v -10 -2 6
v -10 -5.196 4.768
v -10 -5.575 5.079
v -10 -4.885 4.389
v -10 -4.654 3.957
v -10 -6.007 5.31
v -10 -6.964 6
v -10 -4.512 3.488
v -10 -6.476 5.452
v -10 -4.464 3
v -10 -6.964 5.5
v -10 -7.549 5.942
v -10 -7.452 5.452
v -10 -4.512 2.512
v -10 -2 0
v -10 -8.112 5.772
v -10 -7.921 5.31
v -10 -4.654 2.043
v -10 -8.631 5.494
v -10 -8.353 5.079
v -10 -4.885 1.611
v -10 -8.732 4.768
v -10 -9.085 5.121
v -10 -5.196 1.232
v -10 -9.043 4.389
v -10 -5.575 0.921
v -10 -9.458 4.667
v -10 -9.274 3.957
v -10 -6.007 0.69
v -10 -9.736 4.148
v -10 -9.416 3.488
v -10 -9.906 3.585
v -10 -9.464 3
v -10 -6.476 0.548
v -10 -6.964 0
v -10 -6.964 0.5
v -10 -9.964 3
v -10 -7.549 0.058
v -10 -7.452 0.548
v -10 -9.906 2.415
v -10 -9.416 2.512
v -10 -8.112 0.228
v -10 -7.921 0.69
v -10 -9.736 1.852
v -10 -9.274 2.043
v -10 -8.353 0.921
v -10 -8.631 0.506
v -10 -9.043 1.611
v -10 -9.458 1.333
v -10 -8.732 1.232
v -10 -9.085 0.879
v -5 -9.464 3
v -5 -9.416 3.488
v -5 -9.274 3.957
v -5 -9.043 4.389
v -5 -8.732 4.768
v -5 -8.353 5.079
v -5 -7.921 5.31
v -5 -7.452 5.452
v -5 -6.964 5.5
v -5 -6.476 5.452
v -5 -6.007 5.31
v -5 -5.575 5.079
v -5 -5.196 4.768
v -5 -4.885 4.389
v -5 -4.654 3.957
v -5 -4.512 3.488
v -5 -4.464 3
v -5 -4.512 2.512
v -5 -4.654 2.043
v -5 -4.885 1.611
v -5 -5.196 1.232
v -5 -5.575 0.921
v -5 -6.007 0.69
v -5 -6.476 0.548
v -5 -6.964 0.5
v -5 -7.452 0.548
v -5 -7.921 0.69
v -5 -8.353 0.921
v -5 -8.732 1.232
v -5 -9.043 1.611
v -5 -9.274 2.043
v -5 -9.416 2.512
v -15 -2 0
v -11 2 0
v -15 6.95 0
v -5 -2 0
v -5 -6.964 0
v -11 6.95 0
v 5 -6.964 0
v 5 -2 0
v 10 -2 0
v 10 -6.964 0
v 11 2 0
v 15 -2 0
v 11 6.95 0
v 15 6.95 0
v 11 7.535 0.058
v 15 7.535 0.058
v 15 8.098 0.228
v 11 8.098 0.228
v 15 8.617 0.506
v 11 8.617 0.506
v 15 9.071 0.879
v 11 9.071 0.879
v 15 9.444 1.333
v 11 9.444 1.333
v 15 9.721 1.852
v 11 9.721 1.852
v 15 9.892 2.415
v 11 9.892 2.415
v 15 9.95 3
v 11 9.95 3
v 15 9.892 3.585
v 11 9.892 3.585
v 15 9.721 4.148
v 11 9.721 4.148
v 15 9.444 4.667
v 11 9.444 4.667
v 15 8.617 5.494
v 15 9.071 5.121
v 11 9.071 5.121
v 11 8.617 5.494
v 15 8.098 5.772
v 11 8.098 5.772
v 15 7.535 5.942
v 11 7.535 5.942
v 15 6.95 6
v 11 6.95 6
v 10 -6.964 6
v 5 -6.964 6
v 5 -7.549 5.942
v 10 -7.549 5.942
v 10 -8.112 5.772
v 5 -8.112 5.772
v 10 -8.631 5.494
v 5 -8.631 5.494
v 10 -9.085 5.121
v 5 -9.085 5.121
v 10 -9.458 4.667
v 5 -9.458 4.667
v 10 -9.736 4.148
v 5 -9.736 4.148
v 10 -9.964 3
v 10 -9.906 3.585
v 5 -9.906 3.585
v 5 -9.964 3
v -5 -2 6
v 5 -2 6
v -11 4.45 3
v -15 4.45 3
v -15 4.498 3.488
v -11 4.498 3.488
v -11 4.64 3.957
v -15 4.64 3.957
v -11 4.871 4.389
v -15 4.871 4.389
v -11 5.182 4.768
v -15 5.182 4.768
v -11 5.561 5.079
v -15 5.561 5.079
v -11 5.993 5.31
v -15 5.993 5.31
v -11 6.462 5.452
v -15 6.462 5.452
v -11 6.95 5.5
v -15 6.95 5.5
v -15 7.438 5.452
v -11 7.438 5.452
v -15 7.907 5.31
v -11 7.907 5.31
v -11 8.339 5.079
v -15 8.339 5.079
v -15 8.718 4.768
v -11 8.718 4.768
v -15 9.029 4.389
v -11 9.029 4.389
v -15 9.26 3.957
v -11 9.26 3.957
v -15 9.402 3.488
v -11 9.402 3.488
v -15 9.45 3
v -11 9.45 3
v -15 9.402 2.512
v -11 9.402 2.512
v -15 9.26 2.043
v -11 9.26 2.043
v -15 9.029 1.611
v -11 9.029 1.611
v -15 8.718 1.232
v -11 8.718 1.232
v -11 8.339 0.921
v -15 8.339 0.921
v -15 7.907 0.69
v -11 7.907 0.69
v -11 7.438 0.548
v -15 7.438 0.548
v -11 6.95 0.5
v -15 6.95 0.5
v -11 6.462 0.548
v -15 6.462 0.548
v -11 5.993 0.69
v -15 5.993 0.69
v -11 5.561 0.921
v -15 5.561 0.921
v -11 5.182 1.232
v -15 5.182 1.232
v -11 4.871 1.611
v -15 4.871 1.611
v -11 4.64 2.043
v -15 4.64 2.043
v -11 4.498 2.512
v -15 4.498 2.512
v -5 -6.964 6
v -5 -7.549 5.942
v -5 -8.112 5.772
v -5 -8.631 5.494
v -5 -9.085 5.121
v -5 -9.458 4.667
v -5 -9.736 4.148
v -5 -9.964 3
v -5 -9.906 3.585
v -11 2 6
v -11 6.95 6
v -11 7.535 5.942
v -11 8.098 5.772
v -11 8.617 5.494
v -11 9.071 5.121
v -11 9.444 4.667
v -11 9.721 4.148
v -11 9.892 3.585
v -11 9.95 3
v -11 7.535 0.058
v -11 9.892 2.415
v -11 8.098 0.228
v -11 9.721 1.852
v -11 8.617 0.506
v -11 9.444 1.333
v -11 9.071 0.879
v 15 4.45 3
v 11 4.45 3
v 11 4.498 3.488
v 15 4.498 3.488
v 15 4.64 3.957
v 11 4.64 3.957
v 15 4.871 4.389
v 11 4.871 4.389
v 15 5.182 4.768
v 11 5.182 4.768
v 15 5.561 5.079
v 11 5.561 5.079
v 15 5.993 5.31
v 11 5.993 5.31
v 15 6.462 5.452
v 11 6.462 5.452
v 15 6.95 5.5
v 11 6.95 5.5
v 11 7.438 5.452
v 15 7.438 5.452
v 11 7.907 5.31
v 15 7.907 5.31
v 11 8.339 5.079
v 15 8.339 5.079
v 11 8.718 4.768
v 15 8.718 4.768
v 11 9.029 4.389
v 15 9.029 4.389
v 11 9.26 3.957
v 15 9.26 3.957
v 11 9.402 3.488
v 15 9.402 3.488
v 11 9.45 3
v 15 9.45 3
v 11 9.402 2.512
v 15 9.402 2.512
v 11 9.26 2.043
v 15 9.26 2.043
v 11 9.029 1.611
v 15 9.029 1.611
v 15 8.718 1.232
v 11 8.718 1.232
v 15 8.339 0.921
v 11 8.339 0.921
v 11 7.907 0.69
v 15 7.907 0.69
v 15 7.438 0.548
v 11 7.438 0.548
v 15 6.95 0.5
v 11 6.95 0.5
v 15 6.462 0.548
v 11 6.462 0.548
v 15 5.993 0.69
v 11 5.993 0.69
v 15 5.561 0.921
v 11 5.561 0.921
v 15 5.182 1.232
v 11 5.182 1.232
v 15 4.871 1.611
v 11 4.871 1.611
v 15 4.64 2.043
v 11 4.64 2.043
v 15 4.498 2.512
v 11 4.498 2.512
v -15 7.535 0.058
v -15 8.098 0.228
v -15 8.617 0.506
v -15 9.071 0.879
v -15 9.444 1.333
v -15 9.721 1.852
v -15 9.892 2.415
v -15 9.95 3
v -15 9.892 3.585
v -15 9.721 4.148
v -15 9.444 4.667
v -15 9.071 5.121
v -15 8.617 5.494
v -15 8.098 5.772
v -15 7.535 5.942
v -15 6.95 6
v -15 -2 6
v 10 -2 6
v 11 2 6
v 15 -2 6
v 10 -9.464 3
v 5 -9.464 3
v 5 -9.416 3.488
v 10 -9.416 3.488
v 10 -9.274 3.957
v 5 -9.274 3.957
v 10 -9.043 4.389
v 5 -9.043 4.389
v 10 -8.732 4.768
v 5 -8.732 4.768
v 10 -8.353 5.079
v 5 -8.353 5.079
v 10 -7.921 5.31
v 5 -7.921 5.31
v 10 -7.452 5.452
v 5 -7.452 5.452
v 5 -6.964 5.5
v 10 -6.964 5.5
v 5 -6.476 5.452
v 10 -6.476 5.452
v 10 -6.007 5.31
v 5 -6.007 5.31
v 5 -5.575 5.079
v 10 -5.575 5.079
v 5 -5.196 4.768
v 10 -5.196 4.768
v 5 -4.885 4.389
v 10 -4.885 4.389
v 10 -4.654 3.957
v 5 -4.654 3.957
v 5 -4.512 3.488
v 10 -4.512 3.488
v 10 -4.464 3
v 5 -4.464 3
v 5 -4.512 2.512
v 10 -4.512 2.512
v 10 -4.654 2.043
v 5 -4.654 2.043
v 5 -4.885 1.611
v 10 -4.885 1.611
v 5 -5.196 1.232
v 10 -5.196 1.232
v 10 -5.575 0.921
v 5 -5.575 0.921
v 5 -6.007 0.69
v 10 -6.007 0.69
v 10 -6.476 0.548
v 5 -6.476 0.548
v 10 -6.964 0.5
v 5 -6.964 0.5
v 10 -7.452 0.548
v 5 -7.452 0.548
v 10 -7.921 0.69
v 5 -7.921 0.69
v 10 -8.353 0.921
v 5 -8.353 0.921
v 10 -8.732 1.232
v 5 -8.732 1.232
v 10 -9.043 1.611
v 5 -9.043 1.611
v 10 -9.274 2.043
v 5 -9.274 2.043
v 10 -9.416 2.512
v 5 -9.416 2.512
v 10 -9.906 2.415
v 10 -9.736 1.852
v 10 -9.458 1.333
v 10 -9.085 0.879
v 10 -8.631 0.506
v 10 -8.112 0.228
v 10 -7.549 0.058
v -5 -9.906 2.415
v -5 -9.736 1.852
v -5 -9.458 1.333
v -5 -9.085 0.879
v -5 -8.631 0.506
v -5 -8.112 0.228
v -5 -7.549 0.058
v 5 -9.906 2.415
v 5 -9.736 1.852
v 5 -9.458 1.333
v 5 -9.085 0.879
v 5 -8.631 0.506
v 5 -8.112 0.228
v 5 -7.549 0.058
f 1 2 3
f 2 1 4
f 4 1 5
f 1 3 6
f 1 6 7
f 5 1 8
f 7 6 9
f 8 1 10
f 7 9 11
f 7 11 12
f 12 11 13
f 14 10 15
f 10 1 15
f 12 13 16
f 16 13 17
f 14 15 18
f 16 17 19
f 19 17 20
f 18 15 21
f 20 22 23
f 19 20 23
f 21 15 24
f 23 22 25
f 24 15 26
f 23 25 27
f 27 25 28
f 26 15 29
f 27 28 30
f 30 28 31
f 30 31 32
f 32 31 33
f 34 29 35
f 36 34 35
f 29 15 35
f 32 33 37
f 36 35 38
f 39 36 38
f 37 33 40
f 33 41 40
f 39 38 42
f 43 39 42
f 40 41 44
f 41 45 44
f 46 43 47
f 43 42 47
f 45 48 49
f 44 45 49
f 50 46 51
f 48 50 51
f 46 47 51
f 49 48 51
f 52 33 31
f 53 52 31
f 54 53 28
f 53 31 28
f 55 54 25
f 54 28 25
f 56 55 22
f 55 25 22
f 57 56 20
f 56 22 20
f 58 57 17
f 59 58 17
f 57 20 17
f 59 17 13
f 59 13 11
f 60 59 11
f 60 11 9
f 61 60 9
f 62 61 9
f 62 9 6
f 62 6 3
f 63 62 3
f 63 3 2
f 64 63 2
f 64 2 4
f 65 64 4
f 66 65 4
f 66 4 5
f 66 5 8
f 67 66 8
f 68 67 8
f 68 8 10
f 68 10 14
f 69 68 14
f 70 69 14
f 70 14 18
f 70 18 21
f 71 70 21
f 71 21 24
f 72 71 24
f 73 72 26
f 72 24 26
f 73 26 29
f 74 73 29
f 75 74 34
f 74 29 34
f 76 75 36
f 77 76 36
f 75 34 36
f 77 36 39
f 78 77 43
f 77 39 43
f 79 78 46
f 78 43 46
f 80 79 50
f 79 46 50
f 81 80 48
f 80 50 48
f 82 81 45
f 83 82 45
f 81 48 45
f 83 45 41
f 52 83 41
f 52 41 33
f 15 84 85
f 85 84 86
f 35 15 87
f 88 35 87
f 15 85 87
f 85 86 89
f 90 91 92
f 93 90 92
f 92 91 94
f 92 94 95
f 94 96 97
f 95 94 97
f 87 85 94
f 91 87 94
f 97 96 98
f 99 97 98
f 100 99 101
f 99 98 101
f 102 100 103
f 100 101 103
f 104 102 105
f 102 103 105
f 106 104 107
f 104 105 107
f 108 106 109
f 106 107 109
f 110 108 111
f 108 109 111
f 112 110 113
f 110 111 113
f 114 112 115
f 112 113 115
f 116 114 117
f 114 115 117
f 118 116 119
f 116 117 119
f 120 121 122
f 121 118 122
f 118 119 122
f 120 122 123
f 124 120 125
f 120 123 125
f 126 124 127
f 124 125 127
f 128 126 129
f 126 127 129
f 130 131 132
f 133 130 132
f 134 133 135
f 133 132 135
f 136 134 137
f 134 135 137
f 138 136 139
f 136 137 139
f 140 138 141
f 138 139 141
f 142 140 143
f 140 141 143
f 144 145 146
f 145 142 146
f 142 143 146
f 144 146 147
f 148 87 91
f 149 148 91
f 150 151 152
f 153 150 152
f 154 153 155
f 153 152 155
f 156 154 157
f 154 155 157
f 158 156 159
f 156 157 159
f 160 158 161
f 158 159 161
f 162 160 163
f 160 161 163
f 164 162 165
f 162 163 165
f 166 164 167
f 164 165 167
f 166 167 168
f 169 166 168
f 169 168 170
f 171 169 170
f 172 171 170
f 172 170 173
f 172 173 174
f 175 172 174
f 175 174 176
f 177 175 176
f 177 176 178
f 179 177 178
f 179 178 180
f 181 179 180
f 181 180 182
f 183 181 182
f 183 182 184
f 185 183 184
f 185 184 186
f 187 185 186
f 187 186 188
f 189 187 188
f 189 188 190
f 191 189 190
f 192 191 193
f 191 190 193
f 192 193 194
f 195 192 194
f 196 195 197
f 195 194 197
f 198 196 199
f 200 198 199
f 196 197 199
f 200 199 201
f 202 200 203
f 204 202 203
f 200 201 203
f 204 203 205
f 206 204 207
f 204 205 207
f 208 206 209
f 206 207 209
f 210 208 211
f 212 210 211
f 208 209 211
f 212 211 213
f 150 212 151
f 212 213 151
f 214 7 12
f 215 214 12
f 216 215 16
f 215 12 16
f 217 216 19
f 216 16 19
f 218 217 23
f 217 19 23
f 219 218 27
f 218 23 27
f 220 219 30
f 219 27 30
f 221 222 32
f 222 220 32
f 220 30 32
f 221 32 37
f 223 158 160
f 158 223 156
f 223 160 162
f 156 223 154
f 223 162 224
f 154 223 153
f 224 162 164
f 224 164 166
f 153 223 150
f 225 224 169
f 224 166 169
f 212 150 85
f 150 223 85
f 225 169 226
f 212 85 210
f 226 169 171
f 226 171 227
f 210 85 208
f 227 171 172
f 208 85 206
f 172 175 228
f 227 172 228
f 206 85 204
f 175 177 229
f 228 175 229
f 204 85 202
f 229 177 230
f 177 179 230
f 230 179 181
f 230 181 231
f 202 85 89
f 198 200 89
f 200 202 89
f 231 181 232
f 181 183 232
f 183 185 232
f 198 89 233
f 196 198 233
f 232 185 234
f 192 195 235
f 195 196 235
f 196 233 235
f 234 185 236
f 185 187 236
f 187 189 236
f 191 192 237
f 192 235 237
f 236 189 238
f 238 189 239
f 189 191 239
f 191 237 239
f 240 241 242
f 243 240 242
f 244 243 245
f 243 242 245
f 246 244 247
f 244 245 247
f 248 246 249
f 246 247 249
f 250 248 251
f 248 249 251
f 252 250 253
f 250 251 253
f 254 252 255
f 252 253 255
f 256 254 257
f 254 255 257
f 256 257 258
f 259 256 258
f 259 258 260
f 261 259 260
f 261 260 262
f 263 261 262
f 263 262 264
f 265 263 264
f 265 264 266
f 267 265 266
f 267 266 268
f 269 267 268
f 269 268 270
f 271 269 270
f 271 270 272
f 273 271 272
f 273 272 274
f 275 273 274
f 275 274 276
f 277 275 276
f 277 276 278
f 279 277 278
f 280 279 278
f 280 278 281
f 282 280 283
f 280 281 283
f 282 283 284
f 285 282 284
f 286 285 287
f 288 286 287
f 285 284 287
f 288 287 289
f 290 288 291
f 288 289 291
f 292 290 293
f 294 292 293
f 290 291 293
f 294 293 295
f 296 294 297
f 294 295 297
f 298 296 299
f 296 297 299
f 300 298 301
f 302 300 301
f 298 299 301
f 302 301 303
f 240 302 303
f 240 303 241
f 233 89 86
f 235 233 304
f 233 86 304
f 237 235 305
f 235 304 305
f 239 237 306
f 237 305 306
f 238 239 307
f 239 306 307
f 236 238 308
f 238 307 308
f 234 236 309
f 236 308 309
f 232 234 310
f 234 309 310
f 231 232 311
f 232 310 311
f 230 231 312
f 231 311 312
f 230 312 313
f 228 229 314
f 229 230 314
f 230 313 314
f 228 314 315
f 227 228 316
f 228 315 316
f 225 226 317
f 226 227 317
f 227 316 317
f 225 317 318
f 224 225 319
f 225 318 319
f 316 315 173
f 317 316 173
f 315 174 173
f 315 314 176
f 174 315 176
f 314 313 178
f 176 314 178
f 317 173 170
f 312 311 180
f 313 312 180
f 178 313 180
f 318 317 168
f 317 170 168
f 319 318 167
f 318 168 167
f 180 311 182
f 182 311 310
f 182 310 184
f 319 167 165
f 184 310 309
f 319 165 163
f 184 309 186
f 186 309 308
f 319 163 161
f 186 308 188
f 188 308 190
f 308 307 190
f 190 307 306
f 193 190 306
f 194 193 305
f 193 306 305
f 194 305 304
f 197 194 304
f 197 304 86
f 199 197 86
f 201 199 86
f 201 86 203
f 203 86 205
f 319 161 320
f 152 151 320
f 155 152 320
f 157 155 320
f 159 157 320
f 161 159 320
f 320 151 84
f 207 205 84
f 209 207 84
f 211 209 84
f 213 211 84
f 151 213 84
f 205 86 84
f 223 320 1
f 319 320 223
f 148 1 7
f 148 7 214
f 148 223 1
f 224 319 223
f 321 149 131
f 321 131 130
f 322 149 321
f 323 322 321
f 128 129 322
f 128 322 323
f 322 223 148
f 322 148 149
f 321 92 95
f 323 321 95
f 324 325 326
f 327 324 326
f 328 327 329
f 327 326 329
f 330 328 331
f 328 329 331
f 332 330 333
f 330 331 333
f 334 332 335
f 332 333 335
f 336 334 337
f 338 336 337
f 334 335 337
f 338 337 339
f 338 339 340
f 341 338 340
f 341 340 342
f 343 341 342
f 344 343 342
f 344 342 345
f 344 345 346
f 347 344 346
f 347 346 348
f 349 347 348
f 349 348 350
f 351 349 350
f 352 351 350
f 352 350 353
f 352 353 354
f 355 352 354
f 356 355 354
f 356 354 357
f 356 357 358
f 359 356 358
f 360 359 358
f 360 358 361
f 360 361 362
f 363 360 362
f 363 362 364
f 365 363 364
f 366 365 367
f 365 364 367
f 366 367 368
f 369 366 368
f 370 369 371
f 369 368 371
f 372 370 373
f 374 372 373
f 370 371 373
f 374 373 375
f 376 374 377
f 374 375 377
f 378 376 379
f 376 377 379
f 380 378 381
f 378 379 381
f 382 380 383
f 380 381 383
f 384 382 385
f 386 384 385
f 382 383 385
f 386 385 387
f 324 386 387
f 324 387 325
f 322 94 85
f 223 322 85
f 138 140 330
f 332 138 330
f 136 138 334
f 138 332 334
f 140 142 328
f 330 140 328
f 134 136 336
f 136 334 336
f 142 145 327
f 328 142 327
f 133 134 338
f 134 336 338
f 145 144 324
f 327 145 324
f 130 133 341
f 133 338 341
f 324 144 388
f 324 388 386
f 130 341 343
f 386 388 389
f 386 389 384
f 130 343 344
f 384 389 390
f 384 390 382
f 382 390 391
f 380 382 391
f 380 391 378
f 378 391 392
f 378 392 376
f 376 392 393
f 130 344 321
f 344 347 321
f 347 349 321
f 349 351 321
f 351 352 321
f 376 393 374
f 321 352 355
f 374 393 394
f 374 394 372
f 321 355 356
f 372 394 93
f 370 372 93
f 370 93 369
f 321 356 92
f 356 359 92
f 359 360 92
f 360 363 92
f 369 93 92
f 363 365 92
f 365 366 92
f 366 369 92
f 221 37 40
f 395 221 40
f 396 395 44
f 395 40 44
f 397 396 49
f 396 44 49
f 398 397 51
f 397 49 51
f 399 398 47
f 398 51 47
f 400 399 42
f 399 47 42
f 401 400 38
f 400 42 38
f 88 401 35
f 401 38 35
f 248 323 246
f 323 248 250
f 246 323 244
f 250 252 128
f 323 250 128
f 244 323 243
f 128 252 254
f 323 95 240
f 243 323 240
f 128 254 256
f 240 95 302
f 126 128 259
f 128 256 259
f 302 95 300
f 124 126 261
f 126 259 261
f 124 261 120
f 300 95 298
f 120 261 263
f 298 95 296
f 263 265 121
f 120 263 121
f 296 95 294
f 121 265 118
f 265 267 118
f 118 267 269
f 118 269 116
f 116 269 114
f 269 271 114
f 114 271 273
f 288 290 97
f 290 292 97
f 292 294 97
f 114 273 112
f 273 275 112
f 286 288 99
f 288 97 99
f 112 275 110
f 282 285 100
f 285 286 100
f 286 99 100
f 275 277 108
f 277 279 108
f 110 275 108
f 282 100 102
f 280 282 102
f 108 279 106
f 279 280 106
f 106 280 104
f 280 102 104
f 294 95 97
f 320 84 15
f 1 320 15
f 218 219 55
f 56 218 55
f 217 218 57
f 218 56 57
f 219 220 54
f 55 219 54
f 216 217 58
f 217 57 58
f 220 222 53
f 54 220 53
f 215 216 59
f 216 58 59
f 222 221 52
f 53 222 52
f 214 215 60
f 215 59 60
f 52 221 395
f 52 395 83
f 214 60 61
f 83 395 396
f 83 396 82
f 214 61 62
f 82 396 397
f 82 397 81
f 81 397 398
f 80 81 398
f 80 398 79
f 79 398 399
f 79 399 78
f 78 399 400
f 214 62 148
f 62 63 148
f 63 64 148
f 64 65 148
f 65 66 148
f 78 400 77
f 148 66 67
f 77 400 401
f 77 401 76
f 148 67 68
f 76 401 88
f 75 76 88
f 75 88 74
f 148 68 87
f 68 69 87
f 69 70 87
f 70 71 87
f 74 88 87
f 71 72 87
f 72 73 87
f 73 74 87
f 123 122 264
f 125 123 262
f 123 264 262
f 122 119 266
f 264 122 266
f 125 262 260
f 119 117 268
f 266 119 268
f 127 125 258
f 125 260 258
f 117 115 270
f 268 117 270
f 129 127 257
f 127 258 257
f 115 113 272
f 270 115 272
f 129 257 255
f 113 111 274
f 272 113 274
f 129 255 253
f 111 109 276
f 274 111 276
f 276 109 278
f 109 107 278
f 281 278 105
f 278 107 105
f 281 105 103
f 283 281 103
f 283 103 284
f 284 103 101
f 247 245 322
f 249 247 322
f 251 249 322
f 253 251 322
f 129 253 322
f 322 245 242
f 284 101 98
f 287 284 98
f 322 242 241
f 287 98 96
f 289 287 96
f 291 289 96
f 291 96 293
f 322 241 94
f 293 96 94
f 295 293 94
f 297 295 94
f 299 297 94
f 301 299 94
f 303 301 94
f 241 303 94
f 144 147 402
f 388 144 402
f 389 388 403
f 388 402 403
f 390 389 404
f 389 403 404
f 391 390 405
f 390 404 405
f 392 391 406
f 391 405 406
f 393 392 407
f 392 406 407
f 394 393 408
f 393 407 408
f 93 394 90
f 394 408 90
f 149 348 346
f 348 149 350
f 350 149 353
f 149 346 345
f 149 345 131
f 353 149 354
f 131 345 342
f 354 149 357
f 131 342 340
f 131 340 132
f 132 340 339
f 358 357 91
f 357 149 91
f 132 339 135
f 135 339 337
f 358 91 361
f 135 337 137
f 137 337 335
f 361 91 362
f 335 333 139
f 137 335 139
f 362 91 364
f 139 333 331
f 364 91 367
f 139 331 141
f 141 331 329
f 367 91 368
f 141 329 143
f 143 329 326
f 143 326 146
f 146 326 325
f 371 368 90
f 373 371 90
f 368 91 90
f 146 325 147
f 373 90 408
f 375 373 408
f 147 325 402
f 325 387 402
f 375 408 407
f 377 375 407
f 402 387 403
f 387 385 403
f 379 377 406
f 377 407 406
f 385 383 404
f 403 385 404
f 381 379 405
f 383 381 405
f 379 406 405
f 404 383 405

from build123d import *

# Parameters (mm, degrees)
F1_DEPTH = 6
F2_R     = 2.5
F3_DEPTH = 50


with BuildPart() as f1:
    # F0 (on Top) → F1 (new body)
    with BuildSketch(Plane.XY):
        Polygon((5, -10), (10, -10), (10, -2), (15, -2), (15, 10), (11, 10), (11, 2), (-11, 2), (-11, 10), (-15, 10), (-15, -2), (-10, -2), (-10, -10), (-5, -10), (-5, -2), (5, -2), align=None)
    extrude(amount=F1_DEPTH)

    # F2 (on face) → F3 (cut)
    with BuildSketch(Plane(origin=(-15, 0, 0), x_dir=(0, -1, 0), z_dir=(-1, 0, 0))):
        with Locations((-6.949849, 3)):
            Circle(F2_R)
        with BuildLine():
            ThreePointArc((-6.949849, 0), (-9.949849, 3), (-6.949849, 6))
            Line((-6.949849, 6), (-10, 6))
            Line((-10, 6), (-10, 0))
            Line((-10, 0), (-6.949849, 0))
        make_face()
        with Locations((6.964043, 3)):
            Circle(F2_R)
        with BuildLine():
            Line((10, 6), (6.964043, 6))
            ThreePointArc((6.964043, 6), (9.085363, 5.12132), (9.964043, 3))
            ThreePointArc((9.964043, 3), (9.085363, 0.87868), (6.964043, 0))
            Line((6.964043, 0), (10, 0))
            Line((10, 0), (10, 6))
        make_face()
    extrude(amount=-F3_DEPTH, mode=Mode.SUBTRACT)


solid = f1.part
